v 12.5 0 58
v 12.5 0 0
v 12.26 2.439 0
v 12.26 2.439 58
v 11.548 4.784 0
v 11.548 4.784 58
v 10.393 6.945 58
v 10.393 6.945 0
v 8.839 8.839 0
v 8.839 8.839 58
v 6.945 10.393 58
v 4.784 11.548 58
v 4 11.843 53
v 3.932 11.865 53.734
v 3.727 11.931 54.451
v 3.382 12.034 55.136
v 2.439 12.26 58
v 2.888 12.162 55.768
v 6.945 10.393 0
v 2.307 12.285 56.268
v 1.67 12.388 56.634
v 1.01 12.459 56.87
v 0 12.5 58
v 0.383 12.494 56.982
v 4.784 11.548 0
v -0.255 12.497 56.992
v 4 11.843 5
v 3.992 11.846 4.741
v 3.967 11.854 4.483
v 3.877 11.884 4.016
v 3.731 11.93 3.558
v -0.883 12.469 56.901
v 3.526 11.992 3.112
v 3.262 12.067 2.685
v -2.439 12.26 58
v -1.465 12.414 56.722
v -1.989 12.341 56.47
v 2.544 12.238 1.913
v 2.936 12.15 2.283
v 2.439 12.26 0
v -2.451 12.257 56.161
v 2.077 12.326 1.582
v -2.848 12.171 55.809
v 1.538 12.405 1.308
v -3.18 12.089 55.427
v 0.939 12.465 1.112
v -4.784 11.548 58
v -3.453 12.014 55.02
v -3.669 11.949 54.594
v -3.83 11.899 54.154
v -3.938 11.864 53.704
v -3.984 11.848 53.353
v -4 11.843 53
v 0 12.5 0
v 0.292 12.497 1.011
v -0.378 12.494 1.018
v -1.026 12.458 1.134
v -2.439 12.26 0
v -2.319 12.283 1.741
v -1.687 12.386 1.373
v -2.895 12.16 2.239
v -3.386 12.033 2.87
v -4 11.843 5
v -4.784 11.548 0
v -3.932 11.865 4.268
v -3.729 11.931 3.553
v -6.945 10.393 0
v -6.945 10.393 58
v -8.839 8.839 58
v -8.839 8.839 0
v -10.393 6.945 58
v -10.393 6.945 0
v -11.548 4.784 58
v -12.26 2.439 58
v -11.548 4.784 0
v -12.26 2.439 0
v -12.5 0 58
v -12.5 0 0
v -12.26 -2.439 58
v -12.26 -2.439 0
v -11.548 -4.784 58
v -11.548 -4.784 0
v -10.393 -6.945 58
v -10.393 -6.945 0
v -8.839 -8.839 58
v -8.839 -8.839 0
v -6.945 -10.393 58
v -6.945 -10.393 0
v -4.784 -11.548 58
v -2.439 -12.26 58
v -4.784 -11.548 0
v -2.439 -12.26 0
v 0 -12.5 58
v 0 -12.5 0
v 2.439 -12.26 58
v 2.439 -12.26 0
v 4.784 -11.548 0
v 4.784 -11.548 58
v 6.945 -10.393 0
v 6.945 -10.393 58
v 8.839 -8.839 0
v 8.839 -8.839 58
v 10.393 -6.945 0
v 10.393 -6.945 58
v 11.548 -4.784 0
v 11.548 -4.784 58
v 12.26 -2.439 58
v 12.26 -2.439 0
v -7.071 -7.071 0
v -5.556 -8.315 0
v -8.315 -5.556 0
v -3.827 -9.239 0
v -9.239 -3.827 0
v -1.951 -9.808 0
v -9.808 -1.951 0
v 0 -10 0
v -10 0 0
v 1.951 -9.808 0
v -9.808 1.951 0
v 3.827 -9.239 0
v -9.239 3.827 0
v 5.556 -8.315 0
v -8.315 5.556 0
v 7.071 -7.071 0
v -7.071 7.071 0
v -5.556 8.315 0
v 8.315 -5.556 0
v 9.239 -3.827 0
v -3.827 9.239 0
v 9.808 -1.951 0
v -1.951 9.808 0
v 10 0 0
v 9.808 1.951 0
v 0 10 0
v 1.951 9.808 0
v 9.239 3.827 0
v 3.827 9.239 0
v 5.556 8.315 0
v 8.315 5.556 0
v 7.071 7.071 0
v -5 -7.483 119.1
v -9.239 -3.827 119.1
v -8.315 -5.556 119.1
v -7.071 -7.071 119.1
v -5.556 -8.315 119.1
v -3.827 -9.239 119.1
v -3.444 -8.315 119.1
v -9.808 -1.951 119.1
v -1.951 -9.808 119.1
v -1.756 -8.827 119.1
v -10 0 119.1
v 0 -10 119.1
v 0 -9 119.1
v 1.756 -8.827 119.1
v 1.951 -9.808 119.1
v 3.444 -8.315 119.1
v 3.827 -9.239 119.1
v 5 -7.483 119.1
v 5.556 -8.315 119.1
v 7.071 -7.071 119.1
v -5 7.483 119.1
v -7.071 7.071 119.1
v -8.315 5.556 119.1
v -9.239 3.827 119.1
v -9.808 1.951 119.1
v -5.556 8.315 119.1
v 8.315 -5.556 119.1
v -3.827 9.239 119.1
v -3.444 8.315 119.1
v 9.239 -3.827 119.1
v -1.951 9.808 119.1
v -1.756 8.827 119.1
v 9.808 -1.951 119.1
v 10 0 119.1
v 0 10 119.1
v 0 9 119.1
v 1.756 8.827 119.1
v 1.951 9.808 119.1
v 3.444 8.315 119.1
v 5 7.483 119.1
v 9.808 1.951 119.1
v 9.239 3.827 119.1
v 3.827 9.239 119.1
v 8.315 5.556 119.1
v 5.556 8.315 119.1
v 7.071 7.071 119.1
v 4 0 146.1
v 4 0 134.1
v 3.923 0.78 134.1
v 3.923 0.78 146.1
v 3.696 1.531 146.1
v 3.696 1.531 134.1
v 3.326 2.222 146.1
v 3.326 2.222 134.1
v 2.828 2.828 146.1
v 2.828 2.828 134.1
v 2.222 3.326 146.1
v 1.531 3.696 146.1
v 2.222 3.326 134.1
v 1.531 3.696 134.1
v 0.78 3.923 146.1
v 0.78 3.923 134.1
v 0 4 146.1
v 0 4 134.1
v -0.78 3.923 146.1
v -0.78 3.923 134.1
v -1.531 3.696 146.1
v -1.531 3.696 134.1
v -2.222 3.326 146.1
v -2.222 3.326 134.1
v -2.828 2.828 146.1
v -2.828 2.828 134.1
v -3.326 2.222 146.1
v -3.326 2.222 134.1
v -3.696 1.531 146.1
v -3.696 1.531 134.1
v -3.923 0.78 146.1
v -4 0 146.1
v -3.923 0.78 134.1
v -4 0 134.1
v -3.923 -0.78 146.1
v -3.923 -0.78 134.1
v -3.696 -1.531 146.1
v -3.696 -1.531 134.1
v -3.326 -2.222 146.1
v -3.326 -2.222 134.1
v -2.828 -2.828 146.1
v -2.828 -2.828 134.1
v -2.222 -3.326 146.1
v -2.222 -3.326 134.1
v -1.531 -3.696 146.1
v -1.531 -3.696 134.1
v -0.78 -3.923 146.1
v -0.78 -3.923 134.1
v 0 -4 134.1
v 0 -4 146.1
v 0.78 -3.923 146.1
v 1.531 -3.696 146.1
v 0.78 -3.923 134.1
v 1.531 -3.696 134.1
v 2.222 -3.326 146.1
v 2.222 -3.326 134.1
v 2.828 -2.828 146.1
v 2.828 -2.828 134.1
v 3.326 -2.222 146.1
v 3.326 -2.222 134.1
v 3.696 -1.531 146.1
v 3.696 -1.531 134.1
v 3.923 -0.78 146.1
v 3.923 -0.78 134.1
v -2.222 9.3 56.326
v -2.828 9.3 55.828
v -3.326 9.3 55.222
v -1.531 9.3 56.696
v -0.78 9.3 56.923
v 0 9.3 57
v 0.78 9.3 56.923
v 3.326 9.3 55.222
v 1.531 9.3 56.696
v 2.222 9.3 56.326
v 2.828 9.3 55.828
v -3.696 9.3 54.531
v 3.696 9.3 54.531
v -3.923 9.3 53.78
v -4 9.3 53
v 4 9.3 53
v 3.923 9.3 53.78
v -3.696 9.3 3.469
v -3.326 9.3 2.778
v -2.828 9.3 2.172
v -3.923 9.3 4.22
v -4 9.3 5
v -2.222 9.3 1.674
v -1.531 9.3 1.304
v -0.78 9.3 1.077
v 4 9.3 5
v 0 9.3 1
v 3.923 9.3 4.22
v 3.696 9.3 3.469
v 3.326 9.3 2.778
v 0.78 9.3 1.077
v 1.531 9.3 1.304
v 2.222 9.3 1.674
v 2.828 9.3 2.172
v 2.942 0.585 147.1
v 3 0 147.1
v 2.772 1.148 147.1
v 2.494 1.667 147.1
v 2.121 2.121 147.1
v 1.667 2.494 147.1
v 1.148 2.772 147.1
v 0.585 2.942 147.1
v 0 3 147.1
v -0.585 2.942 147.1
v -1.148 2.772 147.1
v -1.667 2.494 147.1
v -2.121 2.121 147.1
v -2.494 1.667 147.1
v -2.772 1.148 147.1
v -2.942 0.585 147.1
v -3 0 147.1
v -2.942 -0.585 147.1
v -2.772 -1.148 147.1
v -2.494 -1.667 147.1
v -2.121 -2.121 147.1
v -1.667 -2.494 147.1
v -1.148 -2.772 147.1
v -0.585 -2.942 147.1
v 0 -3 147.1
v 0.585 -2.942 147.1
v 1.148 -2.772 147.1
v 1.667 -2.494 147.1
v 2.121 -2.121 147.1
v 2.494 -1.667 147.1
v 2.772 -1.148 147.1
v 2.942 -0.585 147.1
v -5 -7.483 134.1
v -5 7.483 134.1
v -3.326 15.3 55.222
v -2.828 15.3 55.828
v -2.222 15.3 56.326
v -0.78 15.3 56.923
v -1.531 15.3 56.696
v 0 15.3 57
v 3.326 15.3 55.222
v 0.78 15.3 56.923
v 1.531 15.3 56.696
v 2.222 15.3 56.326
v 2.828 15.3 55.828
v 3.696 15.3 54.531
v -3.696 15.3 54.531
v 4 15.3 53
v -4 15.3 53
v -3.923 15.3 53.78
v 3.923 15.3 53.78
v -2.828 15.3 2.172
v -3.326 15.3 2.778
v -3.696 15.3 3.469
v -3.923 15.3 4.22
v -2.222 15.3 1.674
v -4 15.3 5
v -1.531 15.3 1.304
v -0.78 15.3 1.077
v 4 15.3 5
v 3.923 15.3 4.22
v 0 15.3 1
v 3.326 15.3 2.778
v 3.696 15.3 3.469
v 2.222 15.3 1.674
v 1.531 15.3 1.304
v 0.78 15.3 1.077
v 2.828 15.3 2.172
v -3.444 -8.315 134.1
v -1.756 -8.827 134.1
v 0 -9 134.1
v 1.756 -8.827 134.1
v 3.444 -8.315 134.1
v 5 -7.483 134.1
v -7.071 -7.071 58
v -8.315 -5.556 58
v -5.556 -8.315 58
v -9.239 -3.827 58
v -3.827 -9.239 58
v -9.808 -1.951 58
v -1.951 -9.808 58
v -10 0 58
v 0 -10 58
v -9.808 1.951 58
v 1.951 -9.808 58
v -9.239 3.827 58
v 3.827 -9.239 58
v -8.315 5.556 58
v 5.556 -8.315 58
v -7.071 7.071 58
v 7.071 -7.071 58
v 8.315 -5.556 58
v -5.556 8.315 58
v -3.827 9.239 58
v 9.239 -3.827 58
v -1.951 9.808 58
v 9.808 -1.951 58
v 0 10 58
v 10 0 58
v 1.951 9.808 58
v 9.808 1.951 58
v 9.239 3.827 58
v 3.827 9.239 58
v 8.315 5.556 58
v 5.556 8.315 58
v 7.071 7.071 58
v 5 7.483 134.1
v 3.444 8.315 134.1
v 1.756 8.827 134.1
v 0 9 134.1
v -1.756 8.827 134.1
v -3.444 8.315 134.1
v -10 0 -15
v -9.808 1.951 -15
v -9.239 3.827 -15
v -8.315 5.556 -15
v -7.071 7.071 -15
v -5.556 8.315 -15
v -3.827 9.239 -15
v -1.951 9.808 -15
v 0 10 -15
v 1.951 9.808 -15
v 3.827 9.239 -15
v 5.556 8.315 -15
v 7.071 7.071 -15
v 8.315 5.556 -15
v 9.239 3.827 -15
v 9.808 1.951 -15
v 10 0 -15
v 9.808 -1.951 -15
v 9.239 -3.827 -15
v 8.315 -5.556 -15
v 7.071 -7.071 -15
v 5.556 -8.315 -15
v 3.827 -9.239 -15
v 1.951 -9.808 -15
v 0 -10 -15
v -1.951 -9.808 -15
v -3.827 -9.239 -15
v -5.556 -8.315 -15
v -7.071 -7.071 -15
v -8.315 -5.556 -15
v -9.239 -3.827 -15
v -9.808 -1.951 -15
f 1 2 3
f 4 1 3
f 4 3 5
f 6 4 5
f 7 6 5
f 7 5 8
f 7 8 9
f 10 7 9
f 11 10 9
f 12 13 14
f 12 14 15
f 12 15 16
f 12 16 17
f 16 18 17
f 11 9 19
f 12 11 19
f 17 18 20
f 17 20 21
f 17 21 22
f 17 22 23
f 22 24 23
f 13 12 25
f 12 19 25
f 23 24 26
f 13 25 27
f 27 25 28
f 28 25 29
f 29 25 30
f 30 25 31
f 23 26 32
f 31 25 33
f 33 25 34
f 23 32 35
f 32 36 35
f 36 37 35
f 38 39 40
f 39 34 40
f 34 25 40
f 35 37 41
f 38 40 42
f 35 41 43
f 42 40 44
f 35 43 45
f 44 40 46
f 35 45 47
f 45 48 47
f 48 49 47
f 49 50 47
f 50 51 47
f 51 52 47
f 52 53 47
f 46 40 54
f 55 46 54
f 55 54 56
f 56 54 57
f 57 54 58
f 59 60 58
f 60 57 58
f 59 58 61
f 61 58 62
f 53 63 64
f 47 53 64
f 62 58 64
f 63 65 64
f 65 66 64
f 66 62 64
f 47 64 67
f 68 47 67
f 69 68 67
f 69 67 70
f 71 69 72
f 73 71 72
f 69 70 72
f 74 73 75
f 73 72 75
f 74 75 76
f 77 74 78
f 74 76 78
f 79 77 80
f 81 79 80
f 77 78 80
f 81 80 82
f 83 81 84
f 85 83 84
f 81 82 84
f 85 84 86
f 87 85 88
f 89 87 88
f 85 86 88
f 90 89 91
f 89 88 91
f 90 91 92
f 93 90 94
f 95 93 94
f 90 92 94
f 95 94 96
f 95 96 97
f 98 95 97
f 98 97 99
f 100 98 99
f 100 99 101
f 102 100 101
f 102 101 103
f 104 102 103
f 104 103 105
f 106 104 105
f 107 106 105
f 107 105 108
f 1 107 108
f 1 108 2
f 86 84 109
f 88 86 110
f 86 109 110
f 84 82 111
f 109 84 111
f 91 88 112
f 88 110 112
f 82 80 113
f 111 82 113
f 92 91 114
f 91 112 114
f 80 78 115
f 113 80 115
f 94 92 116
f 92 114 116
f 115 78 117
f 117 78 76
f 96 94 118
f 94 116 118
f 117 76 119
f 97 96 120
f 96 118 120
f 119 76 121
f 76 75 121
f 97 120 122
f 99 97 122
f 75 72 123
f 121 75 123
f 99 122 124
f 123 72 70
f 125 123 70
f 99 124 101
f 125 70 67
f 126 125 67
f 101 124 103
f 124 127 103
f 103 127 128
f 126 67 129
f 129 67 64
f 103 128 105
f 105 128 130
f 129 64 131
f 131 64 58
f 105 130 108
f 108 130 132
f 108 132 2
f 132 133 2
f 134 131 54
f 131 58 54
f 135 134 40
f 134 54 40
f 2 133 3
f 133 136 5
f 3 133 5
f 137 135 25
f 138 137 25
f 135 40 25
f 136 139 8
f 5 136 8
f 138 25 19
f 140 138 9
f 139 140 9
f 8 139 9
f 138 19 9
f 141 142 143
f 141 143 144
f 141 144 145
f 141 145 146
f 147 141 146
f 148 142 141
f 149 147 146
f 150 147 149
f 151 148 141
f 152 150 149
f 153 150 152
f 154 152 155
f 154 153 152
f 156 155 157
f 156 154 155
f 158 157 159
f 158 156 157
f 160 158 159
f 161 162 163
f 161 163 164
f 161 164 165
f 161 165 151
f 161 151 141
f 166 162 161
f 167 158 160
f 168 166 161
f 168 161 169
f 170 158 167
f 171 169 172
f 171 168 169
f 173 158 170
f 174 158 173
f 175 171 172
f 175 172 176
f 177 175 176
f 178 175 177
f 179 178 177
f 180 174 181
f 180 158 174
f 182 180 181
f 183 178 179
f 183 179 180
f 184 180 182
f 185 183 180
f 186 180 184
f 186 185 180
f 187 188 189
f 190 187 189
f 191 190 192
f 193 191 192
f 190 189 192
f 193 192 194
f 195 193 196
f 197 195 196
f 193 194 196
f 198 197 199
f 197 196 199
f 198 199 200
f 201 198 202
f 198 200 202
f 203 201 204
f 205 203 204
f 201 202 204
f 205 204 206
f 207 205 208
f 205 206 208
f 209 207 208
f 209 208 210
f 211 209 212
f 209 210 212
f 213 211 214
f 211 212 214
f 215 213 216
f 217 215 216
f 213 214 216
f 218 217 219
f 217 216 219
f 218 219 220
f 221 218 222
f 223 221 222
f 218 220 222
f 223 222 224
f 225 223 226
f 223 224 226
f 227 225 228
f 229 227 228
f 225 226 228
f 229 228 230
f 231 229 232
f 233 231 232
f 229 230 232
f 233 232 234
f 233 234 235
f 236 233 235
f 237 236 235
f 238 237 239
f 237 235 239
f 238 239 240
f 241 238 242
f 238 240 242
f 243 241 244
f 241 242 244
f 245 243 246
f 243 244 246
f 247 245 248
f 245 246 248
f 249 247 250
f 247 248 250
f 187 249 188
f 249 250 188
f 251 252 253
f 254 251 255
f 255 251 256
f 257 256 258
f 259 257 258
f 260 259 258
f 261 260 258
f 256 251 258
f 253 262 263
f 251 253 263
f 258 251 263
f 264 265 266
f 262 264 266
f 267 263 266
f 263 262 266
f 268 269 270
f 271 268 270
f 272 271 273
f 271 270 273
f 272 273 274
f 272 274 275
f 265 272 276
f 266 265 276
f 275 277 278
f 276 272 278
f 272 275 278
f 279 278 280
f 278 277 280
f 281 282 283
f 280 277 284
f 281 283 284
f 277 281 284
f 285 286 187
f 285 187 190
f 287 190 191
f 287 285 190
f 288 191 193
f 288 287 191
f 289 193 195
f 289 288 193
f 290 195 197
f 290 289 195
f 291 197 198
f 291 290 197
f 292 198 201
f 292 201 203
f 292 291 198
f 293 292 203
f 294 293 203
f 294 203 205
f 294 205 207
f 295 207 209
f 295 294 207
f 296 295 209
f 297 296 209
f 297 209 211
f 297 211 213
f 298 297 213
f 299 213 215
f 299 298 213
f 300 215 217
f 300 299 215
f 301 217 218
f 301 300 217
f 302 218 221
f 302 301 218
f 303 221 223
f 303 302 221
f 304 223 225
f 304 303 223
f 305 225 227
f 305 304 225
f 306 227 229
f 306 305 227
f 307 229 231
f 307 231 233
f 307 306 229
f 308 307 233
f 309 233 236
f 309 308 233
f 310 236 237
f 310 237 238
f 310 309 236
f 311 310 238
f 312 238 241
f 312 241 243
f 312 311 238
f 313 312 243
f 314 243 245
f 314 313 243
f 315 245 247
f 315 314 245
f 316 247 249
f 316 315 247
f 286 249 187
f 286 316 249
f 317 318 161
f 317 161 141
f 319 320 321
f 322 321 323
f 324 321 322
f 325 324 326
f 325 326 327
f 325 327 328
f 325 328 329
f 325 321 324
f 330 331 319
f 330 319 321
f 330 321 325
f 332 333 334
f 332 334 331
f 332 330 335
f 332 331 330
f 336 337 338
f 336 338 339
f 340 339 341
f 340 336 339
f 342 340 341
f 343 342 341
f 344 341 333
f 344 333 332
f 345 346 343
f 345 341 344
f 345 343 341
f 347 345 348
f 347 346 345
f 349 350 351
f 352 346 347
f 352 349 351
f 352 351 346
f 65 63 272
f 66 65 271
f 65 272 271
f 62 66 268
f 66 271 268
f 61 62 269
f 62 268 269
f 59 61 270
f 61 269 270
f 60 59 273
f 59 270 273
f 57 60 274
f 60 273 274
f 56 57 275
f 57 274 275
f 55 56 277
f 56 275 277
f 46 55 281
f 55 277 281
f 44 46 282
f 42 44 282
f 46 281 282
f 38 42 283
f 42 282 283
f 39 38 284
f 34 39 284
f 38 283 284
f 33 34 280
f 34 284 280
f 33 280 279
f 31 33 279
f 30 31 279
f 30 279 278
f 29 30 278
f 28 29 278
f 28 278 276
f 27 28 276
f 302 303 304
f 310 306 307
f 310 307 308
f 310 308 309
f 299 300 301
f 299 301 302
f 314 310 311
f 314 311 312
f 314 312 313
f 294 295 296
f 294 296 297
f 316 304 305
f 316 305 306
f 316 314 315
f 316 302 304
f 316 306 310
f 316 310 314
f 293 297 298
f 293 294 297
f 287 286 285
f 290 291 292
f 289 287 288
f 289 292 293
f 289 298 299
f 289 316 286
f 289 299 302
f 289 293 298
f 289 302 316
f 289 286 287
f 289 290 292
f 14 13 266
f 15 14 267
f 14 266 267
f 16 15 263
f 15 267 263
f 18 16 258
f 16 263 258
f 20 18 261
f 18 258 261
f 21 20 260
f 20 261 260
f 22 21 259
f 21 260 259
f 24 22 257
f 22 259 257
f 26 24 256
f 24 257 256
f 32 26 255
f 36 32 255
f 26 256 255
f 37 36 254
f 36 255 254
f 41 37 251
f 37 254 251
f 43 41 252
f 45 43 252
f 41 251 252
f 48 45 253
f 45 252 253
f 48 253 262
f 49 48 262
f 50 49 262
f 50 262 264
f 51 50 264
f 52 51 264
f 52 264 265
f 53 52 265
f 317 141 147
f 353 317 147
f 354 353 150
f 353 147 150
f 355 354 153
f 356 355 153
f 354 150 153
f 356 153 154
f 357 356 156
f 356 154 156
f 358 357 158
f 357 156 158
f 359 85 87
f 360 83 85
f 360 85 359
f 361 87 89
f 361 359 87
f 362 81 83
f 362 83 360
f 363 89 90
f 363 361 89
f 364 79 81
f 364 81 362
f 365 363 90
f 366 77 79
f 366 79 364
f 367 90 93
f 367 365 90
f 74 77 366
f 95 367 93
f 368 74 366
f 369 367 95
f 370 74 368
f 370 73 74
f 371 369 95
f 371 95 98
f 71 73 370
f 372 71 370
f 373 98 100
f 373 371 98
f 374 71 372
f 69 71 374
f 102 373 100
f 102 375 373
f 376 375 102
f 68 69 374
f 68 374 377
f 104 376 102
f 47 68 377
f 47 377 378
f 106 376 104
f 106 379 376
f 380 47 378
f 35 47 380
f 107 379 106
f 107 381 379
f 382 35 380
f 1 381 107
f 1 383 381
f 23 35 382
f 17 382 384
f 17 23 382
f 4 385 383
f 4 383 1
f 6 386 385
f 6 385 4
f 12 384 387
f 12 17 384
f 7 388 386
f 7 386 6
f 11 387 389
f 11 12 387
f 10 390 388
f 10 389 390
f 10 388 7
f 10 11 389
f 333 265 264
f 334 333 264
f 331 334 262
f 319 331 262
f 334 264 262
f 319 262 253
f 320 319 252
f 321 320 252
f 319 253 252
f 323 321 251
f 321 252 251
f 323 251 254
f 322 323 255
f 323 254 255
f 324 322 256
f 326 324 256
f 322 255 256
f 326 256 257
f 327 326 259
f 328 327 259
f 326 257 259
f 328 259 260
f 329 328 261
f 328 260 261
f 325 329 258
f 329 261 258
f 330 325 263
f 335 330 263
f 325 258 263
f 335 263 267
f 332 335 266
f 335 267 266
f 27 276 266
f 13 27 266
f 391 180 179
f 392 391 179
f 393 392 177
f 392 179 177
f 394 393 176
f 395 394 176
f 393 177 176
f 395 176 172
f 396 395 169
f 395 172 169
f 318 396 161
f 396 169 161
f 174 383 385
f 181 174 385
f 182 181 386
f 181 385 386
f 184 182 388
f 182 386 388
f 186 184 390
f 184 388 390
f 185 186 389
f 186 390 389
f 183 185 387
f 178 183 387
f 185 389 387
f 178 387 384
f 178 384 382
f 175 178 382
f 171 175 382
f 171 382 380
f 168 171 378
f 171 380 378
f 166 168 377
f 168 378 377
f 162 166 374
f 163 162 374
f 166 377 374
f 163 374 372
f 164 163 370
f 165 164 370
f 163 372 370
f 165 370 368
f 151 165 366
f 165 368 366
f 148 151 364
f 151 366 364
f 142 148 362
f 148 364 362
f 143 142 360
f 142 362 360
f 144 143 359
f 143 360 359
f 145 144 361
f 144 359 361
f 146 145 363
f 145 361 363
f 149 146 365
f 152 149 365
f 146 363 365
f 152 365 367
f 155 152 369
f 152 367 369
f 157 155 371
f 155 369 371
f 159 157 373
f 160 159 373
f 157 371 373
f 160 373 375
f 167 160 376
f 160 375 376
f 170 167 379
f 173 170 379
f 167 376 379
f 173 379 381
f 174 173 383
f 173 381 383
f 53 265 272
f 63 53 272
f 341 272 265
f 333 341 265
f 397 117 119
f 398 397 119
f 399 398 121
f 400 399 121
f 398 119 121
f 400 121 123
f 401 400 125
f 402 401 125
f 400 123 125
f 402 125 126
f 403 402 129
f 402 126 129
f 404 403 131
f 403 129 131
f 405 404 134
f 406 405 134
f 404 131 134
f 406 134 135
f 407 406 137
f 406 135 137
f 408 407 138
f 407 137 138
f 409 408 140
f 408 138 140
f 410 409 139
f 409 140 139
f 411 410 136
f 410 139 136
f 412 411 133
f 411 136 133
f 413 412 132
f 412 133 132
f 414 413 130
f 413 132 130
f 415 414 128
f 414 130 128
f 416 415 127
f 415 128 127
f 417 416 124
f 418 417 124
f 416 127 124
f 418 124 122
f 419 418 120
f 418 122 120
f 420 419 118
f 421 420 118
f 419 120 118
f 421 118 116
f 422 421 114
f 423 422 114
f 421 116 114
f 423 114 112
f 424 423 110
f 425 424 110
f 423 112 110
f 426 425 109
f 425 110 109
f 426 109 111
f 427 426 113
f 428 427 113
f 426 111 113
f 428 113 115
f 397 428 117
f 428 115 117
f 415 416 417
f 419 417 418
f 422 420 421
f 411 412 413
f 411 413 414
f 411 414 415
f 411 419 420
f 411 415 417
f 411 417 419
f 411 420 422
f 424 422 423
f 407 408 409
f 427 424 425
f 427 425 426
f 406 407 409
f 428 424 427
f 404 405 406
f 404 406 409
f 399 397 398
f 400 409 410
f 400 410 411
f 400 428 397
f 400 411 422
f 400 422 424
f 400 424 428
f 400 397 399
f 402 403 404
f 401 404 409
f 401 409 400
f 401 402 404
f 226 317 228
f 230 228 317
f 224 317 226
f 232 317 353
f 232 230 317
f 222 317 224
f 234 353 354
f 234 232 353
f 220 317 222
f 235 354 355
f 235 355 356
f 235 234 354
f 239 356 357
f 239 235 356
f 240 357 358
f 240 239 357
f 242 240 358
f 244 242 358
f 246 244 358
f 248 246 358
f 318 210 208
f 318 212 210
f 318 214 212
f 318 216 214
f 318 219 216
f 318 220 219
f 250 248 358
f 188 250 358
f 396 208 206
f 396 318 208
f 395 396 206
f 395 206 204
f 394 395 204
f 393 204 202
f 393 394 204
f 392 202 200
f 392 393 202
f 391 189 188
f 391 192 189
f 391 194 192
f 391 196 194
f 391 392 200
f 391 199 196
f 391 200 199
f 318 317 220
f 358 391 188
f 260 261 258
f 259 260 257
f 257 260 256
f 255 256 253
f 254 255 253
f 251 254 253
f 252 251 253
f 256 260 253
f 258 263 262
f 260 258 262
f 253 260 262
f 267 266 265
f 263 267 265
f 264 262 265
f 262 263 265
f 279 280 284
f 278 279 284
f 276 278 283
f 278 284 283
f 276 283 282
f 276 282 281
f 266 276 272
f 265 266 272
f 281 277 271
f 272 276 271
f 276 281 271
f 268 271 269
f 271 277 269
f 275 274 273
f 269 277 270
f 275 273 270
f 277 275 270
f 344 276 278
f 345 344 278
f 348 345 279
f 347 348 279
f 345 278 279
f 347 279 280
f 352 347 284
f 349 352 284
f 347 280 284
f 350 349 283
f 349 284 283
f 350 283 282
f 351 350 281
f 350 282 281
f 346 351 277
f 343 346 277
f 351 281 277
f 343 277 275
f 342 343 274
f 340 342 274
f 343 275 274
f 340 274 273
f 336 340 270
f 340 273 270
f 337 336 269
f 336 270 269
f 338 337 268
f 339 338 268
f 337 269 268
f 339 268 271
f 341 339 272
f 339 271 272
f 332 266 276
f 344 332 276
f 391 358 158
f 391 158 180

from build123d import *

# Parameters (mm, degrees)
CROQUIS1_R              = 12.5
SALIENTE_EXTRUIR1_DEPTH = 58
CORTAR_EXTRUIR1_START   = 9.3
CORTAR_EXTRUIR1_DEPTH   = 60
CROQUIS3_R              = 10
SALIENTE_EXTRUIR2_DEPTH = 15
CROQUIS4_R              = 10
SALIENTE_EXTRUIR3_DEPTH = 61.1
SALIENTE_EXTRUIR4_DEPTH = 15
CROQUIS6_R              = 4
SALIENTE_EXTRUIR5_DEPTH = 13
CHAFL_N1_SIZE           = 1
SALIENTE_EXTRUIR6_DEPTH = 6


with BuildPart() as part:
    # Croquis1 → Saliente-Extruir1 (new body)
    with BuildSketch(Plane.XY):
        Circle(CROQUIS1_R)
    extrude(amount=SALIENTE_EXTRUIR1_DEPTH)

    # Croquis2 → Cortar-Extruir1 (cut)
    with BuildSketch(Plane(origin=(0, 0, 0), x_dir=(1, 0, 0), z_dir=(0, 1, 0)).offset(CORTAR_EXTRUIR1_START)):
        with BuildLine():
            Line((4, -5), (4, -53))
            ThreePointArc((4, -53), (0, -57), (-4, -53))
            Line((-4, -53), (-4, -5))
            ThreePointArc((-4, -5), (0, -1), (4, -5))
        make_face()
    extrude(amount=CORTAR_EXTRUIR1_DEPTH, mode=Mode.SUBTRACT)

    # Croquis3 → Saliente-Extruir2 (add)
    with BuildSketch(Plane(origin=(0, 0, 0), x_dir=(-1, 0, 0), z_dir=(0, 0, -1))):
        Circle(CROQUIS3_R)
    extrude(amount=SALIENTE_EXTRUIR2_DEPTH)

    # Croquis4 → Saliente-Extruir3 (add)
    with BuildSketch(Plane.XY.offset(58)):
        Circle(CROQUIS4_R)
    extrude(amount=SALIENTE_EXTRUIR3_DEPTH)

    # Croquis5 → Saliente-Extruir4 (add)
    with BuildSketch(Plane.XY.offset(119.1)):
        with BuildLine():
            Line((-5, 7.483314774), (-5, -7.483314774))
            ThreePointArc((-5, -7.483314774), (0, -9), (5, -7.483314774))
            Line((5, -7.483314774), (5, 7.483314774))
            ThreePointArc((5, 7.483314774), (0, 9), (-5, 7.483314774))
        make_face()
    extrude(amount=SALIENTE_EXTRUIR4_DEPTH)

    # Croquis6 → Saliente-Extruir5 (add)
    with BuildSketch(Plane.XY.offset(134.1)):
        Circle(CROQUIS6_R)
    extrude(amount=SALIENTE_EXTRUIR5_DEPTH)

    # Chaflán1
    chafl_n1_edges = [part.edges().sort_by_distance(p)[0] for p in [
        (-4, 0, 147.1),
    ]]
    chamfer(chafl_n1_edges, length=CHAFL_N1_SIZE)


with BuildPart() as body_2:
    # Croquis7 → Saliente-Extruir6 (new body)
    with BuildSketch(Plane(origin=(0, 9.3, 0), x_dir=(1, 0, 0), z_dir=(0, 1, 0))):
        with BuildLine():
            Line((-4, -5), (-4, -53))
            ThreePointArc((-4, -53), (0, -57), (4, -53))
            Line((4, -53), (4, -5))
            ThreePointArc((4, -5), (0, -1), (-4, -5))
        make_face()
    extrude(amount=SALIENTE_EXTRUIR6_DEPTH)


solid = Compound([part.part, body_2.part])
